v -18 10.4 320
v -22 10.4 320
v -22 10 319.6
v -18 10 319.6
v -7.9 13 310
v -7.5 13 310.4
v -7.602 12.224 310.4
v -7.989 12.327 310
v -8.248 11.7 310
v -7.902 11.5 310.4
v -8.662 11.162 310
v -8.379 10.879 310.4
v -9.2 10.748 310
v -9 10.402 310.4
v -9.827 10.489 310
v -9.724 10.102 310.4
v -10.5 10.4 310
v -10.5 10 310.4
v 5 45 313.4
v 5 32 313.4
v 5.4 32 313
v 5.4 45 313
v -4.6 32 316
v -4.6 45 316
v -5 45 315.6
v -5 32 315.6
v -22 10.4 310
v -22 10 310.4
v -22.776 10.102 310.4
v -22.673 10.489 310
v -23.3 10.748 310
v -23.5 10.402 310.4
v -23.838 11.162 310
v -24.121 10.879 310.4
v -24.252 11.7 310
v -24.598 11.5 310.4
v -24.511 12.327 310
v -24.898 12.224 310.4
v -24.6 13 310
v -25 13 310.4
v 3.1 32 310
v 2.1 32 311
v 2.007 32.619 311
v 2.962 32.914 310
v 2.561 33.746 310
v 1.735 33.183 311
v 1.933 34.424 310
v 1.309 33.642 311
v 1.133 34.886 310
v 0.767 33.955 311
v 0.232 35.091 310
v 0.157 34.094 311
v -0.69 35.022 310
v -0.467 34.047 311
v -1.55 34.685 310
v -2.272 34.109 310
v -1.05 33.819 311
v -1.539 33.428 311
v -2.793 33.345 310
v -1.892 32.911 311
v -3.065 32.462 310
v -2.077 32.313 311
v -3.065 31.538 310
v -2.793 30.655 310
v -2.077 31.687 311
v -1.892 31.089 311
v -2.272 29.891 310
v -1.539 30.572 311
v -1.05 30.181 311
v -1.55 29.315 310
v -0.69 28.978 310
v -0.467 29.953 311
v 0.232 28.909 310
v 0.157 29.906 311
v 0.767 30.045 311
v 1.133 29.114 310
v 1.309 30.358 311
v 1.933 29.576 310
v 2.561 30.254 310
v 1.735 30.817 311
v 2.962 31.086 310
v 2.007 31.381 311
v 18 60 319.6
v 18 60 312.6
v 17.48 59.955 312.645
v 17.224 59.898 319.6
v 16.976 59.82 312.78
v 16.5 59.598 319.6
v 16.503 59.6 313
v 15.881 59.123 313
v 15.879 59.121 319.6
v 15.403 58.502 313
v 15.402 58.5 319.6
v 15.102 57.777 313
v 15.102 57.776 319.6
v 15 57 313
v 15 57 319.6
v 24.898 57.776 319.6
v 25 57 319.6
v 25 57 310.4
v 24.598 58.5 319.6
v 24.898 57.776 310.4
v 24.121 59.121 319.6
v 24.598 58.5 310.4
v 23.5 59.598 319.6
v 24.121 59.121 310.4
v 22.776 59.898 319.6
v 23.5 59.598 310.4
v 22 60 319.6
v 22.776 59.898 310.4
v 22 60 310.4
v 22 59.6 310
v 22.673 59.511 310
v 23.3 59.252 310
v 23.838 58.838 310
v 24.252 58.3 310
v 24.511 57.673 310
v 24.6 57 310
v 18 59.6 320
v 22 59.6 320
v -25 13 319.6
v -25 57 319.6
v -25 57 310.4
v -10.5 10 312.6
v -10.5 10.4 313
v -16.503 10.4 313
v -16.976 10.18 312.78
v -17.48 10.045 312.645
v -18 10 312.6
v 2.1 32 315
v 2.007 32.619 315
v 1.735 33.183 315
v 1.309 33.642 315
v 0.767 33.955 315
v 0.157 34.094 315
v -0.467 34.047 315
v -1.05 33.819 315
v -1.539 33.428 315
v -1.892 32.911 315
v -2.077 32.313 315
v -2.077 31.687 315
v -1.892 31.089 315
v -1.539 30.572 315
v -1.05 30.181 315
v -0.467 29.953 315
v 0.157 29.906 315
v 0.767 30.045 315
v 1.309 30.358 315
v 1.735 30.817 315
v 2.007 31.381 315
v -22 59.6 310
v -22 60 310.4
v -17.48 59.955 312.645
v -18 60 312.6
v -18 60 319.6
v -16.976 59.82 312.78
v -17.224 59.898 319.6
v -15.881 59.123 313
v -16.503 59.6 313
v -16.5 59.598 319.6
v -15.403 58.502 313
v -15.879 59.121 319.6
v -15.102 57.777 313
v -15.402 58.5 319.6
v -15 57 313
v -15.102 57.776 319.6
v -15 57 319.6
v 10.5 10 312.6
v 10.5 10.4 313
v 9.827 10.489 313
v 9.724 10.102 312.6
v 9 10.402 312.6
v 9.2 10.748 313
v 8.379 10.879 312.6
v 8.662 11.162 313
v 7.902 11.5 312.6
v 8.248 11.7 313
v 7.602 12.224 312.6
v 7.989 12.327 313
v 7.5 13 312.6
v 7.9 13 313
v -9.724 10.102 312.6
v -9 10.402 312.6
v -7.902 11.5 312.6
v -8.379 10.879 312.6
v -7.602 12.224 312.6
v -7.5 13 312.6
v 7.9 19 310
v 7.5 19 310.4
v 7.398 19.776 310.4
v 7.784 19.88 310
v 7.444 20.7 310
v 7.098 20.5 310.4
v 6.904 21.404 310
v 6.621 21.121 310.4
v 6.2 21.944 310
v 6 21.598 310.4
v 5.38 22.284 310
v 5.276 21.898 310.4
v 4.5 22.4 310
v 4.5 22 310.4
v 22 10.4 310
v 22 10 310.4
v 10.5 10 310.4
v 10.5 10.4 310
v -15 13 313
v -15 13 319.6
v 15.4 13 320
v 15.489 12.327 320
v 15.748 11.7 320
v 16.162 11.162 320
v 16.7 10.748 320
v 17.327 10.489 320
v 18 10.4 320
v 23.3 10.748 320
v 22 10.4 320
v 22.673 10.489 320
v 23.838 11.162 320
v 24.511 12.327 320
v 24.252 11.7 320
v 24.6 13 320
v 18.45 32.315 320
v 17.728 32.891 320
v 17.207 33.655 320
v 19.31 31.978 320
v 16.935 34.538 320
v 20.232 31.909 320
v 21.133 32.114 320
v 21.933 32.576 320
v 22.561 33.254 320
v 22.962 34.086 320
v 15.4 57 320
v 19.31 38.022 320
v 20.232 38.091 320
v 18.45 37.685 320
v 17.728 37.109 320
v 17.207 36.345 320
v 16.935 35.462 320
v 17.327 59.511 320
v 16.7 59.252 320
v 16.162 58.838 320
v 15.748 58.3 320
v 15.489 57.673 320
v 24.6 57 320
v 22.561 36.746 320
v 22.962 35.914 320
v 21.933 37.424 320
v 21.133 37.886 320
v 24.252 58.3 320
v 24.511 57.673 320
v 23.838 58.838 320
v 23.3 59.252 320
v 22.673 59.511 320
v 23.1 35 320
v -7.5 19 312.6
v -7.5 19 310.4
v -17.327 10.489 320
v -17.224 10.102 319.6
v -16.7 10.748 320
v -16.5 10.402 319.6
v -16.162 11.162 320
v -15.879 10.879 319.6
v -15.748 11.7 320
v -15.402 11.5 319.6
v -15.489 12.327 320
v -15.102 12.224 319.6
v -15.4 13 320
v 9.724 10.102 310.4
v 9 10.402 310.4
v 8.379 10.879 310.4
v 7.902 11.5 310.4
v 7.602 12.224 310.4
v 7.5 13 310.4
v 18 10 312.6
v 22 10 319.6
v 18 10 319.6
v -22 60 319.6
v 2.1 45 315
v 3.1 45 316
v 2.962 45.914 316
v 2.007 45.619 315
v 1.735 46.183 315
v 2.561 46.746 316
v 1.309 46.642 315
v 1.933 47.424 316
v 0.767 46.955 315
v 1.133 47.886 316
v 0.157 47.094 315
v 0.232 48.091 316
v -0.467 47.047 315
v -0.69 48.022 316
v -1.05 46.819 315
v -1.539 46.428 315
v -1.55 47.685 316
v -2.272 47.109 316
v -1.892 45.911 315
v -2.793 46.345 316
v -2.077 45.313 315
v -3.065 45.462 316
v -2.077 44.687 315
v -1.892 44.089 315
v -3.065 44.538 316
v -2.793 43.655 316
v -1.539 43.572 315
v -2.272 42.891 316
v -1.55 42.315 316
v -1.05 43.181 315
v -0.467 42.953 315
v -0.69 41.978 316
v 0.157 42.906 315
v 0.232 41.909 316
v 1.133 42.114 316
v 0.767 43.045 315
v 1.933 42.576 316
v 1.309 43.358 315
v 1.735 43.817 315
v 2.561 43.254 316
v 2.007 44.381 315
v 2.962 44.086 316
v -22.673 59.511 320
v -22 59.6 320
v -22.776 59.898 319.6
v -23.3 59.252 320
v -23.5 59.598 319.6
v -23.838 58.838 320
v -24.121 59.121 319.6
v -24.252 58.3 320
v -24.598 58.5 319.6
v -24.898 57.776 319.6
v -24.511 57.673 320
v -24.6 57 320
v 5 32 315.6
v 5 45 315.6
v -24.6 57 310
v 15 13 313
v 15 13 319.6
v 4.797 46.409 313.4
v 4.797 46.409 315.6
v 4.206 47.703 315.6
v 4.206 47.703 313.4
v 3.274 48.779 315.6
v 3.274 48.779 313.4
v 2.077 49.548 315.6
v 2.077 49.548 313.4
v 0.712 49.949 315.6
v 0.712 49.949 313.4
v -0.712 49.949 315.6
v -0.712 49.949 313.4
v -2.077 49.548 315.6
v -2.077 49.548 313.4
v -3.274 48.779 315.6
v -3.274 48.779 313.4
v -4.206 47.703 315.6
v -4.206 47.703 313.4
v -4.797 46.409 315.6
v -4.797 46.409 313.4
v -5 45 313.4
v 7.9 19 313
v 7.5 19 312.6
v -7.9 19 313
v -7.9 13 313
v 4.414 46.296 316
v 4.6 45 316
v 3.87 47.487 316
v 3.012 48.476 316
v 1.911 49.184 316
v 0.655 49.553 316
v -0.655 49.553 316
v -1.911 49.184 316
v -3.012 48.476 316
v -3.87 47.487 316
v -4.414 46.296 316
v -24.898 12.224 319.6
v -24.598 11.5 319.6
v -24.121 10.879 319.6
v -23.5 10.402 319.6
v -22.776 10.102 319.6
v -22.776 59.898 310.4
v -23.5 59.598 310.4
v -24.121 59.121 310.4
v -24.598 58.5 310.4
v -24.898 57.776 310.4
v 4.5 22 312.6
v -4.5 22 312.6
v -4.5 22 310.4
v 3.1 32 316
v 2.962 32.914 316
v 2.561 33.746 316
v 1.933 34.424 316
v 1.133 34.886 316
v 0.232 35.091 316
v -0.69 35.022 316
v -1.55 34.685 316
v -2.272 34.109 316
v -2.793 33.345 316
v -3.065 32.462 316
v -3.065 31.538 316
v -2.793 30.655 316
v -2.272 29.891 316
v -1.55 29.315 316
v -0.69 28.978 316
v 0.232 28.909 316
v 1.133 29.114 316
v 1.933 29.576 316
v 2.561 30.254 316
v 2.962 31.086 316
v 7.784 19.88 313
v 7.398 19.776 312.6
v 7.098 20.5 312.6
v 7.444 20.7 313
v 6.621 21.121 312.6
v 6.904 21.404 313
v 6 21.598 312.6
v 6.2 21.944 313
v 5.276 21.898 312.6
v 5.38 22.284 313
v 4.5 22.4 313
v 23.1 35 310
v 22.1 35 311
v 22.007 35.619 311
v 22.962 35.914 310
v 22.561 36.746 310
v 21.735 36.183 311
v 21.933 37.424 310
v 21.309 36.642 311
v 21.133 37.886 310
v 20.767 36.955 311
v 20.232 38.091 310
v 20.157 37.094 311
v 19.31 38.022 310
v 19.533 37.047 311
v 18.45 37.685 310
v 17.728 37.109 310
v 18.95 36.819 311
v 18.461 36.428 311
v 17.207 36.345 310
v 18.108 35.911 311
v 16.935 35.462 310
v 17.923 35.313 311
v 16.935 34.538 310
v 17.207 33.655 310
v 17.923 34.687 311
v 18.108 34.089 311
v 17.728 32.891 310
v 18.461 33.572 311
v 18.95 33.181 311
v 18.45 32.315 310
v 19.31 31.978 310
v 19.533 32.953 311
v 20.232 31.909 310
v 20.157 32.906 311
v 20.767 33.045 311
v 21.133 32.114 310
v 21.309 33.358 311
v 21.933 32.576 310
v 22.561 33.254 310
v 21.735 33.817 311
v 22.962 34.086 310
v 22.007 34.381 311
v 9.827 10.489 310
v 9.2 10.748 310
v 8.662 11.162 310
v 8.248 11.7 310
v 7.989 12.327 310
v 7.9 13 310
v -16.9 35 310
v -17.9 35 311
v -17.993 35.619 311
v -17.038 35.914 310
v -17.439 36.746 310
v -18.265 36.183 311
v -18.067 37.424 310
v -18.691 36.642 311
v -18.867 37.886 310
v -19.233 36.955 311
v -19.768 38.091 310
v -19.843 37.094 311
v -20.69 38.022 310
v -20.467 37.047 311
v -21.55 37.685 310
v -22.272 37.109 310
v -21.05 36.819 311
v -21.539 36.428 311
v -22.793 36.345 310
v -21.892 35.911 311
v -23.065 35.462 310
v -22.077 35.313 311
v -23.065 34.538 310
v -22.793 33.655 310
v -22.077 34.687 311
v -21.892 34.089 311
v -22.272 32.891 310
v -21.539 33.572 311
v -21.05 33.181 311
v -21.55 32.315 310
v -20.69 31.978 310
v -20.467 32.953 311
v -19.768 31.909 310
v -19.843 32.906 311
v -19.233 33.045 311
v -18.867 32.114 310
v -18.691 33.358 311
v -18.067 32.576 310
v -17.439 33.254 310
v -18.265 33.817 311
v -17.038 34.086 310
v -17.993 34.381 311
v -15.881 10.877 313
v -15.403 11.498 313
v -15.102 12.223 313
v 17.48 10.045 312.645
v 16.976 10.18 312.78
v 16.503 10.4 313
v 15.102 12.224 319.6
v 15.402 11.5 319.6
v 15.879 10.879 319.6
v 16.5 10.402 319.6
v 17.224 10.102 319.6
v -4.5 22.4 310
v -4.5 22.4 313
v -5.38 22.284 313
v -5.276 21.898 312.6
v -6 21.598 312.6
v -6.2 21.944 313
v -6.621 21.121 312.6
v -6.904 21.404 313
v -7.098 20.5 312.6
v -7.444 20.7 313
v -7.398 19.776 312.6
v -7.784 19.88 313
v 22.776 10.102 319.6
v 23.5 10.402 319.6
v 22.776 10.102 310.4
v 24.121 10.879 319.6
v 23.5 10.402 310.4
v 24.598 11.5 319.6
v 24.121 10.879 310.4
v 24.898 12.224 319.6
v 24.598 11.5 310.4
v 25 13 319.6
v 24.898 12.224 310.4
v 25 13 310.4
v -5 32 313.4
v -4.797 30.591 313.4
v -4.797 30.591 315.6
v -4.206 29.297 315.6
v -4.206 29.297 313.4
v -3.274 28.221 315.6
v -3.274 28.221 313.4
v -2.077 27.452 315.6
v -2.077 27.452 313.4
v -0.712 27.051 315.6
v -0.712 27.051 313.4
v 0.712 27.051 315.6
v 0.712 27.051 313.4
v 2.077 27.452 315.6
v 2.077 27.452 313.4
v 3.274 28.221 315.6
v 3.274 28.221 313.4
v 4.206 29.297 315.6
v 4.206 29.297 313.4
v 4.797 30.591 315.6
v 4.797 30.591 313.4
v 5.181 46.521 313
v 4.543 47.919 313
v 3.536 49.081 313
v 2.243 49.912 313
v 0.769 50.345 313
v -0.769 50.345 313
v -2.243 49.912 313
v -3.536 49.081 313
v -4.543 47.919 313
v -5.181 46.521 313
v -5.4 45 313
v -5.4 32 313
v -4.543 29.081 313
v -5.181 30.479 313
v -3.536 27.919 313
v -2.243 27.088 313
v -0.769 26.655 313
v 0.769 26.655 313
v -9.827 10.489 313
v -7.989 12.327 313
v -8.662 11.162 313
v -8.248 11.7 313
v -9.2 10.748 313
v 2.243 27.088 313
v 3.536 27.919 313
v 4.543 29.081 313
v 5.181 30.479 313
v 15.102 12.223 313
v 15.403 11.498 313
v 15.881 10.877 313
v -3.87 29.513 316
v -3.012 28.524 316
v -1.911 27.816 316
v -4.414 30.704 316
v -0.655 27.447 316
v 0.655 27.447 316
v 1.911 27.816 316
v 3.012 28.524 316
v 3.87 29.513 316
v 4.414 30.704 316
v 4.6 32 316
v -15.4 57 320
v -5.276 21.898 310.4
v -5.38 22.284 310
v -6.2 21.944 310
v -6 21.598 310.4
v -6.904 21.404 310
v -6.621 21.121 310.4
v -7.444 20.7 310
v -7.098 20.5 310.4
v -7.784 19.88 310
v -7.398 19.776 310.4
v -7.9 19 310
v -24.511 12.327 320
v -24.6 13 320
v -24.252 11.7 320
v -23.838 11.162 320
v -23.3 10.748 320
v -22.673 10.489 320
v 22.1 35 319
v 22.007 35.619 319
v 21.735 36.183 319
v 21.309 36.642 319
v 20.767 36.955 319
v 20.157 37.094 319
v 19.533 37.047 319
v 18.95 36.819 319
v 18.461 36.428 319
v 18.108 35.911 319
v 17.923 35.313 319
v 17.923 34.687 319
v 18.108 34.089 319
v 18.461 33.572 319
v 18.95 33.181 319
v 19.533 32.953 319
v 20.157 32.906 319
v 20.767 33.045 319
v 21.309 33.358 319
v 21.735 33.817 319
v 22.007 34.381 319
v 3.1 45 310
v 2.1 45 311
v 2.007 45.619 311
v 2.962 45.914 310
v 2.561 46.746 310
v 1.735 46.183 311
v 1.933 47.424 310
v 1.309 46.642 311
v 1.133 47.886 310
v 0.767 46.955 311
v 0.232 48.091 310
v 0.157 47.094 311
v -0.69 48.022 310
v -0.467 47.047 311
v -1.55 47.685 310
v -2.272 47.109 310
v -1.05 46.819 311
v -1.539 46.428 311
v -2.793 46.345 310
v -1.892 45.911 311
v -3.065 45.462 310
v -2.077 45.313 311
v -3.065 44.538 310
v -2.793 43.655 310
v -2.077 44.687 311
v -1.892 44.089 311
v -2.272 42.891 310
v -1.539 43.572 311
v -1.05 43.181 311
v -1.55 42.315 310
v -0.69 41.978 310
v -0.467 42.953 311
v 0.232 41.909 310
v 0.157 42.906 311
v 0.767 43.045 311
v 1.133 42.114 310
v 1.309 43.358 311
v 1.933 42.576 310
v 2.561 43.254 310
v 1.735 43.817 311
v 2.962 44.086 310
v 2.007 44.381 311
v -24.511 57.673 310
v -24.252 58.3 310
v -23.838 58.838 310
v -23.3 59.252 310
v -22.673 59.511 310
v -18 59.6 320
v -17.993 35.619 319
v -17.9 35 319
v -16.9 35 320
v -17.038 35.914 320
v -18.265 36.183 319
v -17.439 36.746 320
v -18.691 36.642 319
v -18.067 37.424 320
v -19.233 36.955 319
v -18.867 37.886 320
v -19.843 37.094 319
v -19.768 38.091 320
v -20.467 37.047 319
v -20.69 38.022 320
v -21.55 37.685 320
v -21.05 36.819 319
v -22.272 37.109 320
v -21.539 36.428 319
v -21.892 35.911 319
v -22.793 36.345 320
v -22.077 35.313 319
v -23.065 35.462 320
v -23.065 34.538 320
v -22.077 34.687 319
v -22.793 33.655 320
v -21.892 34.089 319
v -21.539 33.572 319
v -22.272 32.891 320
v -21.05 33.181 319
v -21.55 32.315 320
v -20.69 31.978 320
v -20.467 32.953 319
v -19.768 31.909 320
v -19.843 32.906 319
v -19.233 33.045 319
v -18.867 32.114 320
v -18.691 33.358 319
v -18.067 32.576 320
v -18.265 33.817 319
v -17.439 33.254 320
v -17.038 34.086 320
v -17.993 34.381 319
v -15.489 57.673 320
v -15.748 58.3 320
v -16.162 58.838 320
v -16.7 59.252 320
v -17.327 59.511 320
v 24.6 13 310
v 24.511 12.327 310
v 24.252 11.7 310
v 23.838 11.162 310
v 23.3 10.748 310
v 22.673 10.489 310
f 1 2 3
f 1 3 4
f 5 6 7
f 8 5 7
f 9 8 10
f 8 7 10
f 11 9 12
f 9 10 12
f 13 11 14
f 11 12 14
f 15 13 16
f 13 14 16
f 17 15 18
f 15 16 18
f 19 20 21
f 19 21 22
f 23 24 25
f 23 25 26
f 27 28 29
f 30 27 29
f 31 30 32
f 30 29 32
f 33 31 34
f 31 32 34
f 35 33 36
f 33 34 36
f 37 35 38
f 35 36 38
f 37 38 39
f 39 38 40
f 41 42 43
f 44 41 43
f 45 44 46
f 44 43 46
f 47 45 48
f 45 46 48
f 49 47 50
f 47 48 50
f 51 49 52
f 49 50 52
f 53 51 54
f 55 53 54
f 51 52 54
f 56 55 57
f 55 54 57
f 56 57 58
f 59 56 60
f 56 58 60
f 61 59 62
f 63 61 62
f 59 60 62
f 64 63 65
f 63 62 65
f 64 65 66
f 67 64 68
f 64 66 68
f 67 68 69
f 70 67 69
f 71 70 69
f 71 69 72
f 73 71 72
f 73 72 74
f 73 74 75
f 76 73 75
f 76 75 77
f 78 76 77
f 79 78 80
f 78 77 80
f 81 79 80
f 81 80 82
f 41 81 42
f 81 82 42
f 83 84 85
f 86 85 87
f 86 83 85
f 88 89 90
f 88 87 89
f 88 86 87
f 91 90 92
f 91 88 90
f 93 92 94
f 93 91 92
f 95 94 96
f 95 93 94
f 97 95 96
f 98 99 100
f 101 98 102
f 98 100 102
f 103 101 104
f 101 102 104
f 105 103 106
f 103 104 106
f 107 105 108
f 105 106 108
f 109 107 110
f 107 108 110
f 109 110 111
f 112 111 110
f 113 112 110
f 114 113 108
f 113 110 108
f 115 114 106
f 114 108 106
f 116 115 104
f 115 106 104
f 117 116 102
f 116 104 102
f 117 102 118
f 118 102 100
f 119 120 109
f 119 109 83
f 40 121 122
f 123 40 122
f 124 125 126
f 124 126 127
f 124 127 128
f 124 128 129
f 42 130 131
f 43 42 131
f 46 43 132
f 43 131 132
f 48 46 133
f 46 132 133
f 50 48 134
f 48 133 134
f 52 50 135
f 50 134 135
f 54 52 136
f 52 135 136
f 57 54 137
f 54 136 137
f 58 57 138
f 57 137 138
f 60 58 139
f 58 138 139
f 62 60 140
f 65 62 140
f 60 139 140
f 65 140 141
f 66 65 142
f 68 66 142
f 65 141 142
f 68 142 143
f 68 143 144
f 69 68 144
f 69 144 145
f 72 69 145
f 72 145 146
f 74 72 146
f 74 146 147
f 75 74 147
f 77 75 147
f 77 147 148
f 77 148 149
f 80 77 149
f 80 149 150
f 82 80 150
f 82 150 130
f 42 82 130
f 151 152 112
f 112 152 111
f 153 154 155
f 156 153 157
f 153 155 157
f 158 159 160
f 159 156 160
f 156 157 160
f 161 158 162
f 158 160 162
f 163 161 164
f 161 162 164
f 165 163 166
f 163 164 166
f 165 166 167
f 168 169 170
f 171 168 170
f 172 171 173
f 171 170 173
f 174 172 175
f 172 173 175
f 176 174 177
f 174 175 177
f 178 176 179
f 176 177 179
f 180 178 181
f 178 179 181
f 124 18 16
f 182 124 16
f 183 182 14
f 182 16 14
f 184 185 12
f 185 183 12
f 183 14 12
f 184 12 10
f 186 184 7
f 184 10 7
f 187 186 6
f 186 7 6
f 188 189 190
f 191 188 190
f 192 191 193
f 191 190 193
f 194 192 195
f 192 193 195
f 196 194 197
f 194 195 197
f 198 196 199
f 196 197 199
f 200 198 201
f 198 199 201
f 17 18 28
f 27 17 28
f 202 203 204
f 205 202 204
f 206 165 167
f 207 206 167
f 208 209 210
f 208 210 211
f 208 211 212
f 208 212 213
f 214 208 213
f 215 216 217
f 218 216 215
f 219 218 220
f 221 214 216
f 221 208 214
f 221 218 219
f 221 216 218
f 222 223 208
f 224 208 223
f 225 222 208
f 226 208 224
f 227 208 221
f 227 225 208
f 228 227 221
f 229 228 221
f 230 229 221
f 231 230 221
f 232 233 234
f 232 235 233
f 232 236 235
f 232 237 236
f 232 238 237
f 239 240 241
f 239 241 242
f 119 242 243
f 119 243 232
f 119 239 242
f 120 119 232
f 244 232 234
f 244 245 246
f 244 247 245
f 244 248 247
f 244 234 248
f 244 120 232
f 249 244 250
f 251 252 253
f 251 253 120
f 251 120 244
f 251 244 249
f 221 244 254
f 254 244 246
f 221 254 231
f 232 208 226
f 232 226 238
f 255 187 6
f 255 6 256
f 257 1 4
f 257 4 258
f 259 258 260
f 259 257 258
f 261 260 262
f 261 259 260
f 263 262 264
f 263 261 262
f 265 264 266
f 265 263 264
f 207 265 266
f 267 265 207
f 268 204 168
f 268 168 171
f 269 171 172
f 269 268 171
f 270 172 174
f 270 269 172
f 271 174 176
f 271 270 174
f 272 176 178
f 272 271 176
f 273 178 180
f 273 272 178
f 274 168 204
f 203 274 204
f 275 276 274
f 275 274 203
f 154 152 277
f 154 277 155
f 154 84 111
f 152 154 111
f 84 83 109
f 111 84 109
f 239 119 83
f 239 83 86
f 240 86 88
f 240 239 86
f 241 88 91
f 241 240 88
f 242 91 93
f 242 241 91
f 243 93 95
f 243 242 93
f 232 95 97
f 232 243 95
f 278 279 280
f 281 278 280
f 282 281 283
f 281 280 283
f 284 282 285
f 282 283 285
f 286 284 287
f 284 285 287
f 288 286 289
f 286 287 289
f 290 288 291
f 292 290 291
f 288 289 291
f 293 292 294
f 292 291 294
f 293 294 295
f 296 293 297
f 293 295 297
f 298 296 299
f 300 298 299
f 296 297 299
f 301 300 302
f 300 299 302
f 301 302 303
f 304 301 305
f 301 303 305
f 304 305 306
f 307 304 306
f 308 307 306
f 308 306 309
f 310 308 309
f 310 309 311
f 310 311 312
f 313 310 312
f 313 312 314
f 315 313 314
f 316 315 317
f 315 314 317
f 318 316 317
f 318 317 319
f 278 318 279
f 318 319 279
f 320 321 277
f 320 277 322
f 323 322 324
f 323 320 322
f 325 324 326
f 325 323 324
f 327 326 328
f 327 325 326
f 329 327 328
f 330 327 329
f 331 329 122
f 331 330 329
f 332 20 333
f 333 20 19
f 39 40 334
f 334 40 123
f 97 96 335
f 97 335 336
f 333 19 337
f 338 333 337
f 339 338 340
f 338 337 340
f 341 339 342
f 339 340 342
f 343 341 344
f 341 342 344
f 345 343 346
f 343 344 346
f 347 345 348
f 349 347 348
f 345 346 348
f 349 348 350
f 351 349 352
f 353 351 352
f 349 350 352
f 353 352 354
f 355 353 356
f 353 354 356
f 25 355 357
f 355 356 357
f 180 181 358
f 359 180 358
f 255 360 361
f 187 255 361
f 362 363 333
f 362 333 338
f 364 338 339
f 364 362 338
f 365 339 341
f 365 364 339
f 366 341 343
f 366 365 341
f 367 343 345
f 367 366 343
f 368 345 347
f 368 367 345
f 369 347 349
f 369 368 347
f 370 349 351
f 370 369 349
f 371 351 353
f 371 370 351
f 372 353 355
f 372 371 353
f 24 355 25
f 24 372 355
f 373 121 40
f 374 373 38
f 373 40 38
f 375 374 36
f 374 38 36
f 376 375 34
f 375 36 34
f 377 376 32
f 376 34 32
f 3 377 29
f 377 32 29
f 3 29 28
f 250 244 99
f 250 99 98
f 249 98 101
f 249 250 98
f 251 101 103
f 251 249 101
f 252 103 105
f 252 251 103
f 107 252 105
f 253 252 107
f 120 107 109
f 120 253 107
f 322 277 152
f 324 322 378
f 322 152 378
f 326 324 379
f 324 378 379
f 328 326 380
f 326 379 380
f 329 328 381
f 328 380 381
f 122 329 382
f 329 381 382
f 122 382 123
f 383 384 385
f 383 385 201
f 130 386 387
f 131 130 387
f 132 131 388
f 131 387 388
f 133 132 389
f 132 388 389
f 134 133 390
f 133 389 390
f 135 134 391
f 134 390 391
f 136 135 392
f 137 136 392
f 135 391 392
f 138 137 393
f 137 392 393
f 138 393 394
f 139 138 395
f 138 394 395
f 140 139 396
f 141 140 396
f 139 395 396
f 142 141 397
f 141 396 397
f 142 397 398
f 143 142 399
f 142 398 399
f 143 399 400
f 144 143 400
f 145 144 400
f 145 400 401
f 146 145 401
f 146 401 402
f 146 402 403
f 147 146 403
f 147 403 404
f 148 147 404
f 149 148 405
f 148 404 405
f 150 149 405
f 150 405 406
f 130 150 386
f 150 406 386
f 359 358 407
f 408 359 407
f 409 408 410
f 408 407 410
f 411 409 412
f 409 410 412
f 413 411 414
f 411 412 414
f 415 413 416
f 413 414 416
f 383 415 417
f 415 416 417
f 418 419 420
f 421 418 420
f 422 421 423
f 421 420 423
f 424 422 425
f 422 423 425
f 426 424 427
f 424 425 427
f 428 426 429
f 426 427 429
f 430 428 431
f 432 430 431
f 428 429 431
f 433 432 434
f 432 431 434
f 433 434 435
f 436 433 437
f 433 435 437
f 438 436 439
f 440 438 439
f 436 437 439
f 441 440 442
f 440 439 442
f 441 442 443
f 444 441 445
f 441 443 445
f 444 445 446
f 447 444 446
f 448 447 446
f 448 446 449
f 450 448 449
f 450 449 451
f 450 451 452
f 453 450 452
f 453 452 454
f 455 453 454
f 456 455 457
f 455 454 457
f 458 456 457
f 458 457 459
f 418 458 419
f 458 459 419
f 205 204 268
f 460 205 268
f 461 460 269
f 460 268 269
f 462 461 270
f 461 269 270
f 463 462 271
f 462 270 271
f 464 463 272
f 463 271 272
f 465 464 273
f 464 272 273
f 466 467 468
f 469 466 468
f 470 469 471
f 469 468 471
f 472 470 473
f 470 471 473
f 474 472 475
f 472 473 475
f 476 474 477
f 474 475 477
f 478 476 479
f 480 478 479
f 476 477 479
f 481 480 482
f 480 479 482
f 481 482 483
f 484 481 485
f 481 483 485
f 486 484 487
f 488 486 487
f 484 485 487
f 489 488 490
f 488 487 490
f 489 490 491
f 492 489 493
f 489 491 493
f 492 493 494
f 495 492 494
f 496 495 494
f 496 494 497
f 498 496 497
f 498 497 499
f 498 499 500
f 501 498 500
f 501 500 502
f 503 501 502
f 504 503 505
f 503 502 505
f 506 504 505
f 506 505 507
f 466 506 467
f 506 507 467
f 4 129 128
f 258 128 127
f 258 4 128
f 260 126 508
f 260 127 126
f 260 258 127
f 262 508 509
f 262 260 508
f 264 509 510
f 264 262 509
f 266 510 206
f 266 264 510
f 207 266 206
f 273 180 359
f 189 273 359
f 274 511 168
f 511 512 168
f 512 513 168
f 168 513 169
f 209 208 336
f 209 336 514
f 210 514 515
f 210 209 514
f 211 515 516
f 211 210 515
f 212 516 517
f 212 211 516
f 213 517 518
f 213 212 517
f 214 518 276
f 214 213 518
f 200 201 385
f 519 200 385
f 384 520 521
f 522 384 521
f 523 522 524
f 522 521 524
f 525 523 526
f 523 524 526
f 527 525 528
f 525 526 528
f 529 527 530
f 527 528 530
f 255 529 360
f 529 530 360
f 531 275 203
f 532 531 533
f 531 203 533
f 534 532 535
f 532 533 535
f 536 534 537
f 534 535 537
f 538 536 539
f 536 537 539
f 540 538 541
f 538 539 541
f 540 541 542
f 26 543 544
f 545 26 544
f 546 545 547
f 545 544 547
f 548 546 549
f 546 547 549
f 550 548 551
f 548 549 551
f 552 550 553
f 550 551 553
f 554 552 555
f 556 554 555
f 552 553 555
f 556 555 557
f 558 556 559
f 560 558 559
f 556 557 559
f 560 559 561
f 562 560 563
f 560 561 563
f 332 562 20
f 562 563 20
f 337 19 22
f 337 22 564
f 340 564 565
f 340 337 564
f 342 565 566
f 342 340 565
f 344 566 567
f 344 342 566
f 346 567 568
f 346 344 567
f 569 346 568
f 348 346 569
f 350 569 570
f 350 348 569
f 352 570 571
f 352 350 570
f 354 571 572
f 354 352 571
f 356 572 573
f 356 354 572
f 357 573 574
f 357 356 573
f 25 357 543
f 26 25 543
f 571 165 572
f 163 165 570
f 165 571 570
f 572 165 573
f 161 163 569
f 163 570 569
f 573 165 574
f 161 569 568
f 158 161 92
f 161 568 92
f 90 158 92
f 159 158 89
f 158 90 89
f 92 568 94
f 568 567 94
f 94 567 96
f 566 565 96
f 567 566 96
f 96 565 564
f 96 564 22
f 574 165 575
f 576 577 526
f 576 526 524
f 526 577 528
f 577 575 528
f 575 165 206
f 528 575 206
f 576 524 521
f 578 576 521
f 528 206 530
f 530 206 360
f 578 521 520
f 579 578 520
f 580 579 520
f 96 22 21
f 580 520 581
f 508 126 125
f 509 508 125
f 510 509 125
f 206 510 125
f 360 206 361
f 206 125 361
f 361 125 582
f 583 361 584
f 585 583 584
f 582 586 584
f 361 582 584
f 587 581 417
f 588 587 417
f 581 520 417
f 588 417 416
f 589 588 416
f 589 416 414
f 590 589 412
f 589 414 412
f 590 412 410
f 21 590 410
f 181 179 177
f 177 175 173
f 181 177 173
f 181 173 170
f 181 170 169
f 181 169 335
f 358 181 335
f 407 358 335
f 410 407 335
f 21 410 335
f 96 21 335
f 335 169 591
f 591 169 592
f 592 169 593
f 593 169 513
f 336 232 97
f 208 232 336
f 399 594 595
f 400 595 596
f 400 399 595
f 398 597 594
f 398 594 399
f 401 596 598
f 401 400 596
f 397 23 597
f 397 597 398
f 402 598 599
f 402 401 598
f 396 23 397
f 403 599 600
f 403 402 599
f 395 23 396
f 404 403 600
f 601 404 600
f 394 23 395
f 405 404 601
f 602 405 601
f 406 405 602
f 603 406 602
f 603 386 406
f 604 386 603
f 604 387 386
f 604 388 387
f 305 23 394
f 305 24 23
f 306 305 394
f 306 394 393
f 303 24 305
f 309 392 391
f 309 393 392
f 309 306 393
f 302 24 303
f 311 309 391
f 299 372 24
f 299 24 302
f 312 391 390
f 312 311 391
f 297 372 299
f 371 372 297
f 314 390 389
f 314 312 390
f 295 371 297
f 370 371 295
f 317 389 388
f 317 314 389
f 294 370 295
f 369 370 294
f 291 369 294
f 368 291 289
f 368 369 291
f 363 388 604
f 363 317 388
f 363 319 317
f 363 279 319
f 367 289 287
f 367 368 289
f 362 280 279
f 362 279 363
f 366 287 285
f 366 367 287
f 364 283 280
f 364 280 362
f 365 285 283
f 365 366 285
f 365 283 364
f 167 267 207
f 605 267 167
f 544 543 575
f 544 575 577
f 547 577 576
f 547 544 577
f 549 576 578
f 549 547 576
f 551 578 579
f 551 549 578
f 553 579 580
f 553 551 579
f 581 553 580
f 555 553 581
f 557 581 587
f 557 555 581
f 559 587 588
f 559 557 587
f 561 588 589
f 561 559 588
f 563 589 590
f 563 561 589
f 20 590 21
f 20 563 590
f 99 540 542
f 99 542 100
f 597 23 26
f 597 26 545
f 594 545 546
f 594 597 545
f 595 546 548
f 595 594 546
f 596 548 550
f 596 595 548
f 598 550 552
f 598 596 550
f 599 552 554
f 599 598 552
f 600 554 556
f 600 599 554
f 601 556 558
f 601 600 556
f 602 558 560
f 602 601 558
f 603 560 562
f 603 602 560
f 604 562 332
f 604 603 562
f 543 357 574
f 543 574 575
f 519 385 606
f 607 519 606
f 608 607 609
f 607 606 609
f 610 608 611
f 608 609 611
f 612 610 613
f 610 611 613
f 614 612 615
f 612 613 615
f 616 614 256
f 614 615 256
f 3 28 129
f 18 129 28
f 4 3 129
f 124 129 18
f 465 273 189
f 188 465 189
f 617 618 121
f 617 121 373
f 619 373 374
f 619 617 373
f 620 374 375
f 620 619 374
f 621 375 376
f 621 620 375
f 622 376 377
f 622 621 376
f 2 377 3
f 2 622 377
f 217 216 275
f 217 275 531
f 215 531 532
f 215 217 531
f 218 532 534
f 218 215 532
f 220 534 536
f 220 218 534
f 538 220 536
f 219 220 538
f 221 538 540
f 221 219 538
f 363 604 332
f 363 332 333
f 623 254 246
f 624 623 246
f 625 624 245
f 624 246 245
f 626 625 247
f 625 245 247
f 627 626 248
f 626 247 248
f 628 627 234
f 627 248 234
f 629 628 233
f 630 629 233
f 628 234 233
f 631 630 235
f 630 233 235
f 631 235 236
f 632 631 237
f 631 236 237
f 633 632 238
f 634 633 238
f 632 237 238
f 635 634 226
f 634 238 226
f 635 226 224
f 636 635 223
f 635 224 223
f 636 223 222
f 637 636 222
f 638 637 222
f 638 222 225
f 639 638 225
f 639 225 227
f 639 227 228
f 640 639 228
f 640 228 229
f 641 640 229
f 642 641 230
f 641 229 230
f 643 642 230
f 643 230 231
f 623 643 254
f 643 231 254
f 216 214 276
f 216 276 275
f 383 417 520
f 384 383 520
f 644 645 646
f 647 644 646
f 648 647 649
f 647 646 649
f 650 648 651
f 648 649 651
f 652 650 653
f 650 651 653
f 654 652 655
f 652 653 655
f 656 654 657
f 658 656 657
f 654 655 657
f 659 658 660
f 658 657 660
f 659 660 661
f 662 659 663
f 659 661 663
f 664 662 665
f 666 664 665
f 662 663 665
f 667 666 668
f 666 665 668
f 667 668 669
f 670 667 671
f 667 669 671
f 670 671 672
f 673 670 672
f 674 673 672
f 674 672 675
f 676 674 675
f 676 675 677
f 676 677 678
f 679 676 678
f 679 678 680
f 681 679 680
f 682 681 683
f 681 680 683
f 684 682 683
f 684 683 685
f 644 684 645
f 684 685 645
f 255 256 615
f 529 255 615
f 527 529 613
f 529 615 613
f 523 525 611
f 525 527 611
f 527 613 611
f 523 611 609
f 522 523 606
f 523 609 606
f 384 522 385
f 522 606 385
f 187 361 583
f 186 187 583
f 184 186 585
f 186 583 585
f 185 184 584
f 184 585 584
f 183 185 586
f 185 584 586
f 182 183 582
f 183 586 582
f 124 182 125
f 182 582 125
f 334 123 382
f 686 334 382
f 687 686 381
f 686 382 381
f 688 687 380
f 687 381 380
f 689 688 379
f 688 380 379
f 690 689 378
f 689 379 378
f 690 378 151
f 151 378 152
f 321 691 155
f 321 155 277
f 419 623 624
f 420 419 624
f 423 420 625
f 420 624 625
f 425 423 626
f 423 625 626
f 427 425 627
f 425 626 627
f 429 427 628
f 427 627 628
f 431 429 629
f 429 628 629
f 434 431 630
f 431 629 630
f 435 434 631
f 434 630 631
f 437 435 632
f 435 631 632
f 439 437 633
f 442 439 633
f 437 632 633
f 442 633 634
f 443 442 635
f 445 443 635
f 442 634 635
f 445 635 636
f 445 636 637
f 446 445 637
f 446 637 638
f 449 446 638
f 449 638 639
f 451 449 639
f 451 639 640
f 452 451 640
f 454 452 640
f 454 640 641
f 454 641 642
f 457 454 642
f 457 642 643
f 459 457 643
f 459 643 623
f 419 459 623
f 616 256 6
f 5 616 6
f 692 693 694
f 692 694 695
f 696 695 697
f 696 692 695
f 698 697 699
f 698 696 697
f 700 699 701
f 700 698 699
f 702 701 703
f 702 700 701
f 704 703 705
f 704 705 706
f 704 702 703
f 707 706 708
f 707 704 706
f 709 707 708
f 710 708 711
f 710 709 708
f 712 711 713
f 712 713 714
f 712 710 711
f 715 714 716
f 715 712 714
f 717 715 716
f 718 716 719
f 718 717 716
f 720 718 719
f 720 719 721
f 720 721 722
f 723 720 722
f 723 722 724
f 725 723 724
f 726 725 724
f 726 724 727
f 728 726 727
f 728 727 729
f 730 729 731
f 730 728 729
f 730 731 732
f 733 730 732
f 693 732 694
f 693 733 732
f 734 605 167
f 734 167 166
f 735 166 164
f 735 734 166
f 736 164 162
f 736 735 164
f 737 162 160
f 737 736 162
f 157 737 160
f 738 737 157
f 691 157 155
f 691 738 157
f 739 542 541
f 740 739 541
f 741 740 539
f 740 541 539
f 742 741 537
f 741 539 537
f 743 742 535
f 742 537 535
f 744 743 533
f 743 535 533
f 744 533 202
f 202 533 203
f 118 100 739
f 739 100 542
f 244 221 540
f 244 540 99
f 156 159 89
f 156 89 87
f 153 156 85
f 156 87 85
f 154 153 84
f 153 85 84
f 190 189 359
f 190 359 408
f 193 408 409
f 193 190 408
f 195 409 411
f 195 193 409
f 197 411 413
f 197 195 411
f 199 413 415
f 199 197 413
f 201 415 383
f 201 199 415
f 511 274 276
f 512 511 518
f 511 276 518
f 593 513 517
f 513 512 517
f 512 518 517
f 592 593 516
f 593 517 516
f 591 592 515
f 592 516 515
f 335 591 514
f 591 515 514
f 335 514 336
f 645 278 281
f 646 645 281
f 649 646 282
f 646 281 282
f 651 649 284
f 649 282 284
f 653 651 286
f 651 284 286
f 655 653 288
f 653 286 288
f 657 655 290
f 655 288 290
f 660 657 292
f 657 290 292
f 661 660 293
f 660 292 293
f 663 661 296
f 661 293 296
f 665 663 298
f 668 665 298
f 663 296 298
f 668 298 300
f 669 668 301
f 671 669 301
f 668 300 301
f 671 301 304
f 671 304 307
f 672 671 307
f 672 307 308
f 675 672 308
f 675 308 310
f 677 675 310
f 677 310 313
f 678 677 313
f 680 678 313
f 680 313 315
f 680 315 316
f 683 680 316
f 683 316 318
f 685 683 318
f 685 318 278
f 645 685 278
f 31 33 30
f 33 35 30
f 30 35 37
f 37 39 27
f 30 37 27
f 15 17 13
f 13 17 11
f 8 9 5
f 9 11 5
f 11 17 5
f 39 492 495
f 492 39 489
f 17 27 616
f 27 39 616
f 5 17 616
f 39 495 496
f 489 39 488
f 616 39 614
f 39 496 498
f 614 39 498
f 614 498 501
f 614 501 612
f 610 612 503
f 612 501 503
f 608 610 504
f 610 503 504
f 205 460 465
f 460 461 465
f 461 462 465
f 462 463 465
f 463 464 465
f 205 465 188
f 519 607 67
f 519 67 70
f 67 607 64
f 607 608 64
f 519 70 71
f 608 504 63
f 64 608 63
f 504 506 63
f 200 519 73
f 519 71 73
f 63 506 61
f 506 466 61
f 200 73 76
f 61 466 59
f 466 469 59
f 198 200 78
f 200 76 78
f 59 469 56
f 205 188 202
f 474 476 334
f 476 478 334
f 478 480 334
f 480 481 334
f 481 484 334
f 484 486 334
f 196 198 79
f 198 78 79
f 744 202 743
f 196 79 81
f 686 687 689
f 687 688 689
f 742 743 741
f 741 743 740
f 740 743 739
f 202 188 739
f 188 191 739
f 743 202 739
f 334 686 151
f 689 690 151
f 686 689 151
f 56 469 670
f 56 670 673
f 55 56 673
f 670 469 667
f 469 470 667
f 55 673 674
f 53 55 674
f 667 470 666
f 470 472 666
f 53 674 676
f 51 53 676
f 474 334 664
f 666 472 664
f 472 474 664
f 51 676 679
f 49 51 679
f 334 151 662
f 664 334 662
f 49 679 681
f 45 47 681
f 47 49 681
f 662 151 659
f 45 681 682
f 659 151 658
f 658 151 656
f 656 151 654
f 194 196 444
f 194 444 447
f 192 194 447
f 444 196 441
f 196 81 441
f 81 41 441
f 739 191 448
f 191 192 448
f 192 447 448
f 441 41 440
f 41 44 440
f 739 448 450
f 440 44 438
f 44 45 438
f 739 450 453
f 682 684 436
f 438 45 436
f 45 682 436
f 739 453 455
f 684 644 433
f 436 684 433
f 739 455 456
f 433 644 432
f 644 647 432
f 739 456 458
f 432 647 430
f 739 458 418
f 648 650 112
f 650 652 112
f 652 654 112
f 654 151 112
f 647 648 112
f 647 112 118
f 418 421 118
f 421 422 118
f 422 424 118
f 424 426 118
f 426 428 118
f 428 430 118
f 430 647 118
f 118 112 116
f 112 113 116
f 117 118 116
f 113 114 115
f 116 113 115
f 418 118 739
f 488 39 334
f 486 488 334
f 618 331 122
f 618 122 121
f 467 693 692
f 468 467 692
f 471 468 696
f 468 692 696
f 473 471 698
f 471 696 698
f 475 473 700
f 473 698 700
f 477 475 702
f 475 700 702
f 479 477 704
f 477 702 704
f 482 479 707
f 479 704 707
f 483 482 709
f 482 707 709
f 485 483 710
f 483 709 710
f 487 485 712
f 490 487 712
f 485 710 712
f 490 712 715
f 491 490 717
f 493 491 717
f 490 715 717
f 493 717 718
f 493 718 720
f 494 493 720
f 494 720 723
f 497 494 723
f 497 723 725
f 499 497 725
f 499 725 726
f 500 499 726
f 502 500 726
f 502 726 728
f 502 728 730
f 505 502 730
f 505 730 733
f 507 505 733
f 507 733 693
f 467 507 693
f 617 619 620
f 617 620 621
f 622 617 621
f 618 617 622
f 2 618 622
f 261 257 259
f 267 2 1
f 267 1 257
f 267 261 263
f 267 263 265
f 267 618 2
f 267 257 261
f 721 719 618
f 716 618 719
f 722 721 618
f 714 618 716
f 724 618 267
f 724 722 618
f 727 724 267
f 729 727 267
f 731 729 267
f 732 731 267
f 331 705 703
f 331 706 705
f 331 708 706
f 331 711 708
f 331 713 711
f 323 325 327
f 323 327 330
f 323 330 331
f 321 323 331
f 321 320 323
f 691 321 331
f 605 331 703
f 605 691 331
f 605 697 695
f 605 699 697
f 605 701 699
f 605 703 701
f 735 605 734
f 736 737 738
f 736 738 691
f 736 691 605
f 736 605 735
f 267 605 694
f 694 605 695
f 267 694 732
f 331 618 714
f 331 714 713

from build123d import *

# Parameters (mm, degrees)
SKETCH219_W     = 50
SKETCH219_H     = 50
PAD112_DEPTH    = 10
SKETCH220_W     = 30
SKETCH220_H     = 7
POCKET049_DEPTH = 60.001
SKETCH221_R     = 2.1
POCKET050_DEPTH = 10.001
PAD113_DEPTH    = 3
SKETCH223_R     = 2.1
POCKET051_DEPTH = 7
SKETCH224_W     = 15
SKETCH224_H     = 12
POCKET052_DEPTH = 3.001
FILLET070_R     = 3
CHAMFER076_SIZE = 1
FILLET071_R     = 3
CHAMFER077_SIZE = 0.4
CHAMFER078_SIZE = 0.4


with BuildPart() as part:
    # Sketch219 → Pad112 (new body)
    with BuildSketch(Plane.XY):
        with Locations((0, 35)):
            Rectangle(SKETCH219_W, SKETCH219_H)
    extrude(amount=-PAD112_DEPTH)

    # Sketch220 → Pocket049 (cut, through all)
    with BuildSketch(Plane.XZ):
        with Locations((0, -3.5)):
            Rectangle(SKETCH220_W, SKETCH220_H)
    extrude(amount=-POCKET049_DEPTH, mode=Mode.SUBTRACT)

    # Sketch221 → Pocket050 (cut, through all)
    with BuildSketch(Plane.XY):
        with Locations((-20, 35)):
            Circle(SKETCH221_R)
        with Locations((20, 35)):
            Circle(SKETCH221_R)
    extrude(amount=-POCKET050_DEPTH, mode=Mode.SUBTRACT)

    # Sketch222 (on Face8 of Pocket050) → Pad113 (join)
    with BuildSketch(Plane.XY.offset(-7)):
        with BuildLine():
            ThreePointArc((5, 45), (0, 50), (-5, 45))
            Line((-5, 45), (-5, 32))
            ThreePointArc((-5, 32), (0, 27), (5, 32))
            Line((5, 32), (5, 45))
        make_face()
    extrude(amount=PAD113_DEPTH)

    # Sketch223 (on Face17 of Pad113) → Pocket051 (cut)
    with BuildSketch(Plane.XY.offset(-4)):
        with Locations((0, 45)):
            Circle(SKETCH223_R)
        with Locations((0, 32)):
            Circle(SKETCH223_R)
    extrude(amount=-POCKET051_DEPTH, mode=Mode.SUBTRACT)

    # Sketch224 (on Face8 of Pocket051) → Pocket052 (cut, through all)
    with BuildSketch(Plane.XY.offset(-7)):
        with Locations((0, 16)):
            Rectangle(SKETCH224_W, SKETCH224_H)
    extrude(amount=-POCKET052_DEPTH, mode=Mode.SUBTRACT)

    # Fillet070
    fillet070_edges = [part.edges().sort_by_distance(p)[0] for p in [
        (-7.5, 10, -8.5),
        (7.5, 10, -8.5),
        (-7.5, 22, -8.5),
        (7.5, 22, -8.5),
    ]]
    fillet(fillet070_edges, radius=FILLET070_R)

    # Chamfer076
    chamfer076_edges = [part.edges().sort_by_distance(p)[0] for p in [
        (-22.1, 35, 0),
        (-22.1, 35, -10),
        (-2.1, 32, -4),
        (-2.1, 32, -10),
        (-2.1, 45, -4),
        (-2.1, 45, -10),
        (17.9, 35, 0),
        (17.9, 35, -10),
    ]]
    chamfer(chamfer076_edges, length=CHAMFER076_SIZE)

    # Fillet071
    fillet071_edges = [part.edges().sort_by_distance(p)[0] for p in [
        (-25, 10, -5),
        (-25, 60, -5),
        (25, 60, -5),
        (25, 10, -5),
        (-15, 10, -3.5),
        (-15, 60, -3.5),
        (15, 60, -3.5),
        (15, 10, -3.5),
    ]]
    fillet(fillet071_edges, radius=FILLET071_R)

    # Chamfer077
    chamfer077_edges = [part.edges().sort_by_distance(p)[0] for p in [
        (8.37868, 10.87868, -10),
    ]]
    chamfer(chamfer077_edges, length=CHAMFER077_SIZE)

    # Chamfer078
    chamfer078_edges = [part.edges().sort_by_distance(p)[0] for p in [
        (-20, 10, 0),
        (20, 10, 0),
        (0, 27, -4),
        (0, 27, -7),
        (-12.75, 10, -7),
        (0, 60, -7),
    ]]
    chamfer(chamfer078_edges, length=CHAMFER078_SIZE)


with BuildPart() as part_1:
    # Body097 placement: moved
    add(part.part.moved(Location((0, 0, 320))))


solid = part_1.part
